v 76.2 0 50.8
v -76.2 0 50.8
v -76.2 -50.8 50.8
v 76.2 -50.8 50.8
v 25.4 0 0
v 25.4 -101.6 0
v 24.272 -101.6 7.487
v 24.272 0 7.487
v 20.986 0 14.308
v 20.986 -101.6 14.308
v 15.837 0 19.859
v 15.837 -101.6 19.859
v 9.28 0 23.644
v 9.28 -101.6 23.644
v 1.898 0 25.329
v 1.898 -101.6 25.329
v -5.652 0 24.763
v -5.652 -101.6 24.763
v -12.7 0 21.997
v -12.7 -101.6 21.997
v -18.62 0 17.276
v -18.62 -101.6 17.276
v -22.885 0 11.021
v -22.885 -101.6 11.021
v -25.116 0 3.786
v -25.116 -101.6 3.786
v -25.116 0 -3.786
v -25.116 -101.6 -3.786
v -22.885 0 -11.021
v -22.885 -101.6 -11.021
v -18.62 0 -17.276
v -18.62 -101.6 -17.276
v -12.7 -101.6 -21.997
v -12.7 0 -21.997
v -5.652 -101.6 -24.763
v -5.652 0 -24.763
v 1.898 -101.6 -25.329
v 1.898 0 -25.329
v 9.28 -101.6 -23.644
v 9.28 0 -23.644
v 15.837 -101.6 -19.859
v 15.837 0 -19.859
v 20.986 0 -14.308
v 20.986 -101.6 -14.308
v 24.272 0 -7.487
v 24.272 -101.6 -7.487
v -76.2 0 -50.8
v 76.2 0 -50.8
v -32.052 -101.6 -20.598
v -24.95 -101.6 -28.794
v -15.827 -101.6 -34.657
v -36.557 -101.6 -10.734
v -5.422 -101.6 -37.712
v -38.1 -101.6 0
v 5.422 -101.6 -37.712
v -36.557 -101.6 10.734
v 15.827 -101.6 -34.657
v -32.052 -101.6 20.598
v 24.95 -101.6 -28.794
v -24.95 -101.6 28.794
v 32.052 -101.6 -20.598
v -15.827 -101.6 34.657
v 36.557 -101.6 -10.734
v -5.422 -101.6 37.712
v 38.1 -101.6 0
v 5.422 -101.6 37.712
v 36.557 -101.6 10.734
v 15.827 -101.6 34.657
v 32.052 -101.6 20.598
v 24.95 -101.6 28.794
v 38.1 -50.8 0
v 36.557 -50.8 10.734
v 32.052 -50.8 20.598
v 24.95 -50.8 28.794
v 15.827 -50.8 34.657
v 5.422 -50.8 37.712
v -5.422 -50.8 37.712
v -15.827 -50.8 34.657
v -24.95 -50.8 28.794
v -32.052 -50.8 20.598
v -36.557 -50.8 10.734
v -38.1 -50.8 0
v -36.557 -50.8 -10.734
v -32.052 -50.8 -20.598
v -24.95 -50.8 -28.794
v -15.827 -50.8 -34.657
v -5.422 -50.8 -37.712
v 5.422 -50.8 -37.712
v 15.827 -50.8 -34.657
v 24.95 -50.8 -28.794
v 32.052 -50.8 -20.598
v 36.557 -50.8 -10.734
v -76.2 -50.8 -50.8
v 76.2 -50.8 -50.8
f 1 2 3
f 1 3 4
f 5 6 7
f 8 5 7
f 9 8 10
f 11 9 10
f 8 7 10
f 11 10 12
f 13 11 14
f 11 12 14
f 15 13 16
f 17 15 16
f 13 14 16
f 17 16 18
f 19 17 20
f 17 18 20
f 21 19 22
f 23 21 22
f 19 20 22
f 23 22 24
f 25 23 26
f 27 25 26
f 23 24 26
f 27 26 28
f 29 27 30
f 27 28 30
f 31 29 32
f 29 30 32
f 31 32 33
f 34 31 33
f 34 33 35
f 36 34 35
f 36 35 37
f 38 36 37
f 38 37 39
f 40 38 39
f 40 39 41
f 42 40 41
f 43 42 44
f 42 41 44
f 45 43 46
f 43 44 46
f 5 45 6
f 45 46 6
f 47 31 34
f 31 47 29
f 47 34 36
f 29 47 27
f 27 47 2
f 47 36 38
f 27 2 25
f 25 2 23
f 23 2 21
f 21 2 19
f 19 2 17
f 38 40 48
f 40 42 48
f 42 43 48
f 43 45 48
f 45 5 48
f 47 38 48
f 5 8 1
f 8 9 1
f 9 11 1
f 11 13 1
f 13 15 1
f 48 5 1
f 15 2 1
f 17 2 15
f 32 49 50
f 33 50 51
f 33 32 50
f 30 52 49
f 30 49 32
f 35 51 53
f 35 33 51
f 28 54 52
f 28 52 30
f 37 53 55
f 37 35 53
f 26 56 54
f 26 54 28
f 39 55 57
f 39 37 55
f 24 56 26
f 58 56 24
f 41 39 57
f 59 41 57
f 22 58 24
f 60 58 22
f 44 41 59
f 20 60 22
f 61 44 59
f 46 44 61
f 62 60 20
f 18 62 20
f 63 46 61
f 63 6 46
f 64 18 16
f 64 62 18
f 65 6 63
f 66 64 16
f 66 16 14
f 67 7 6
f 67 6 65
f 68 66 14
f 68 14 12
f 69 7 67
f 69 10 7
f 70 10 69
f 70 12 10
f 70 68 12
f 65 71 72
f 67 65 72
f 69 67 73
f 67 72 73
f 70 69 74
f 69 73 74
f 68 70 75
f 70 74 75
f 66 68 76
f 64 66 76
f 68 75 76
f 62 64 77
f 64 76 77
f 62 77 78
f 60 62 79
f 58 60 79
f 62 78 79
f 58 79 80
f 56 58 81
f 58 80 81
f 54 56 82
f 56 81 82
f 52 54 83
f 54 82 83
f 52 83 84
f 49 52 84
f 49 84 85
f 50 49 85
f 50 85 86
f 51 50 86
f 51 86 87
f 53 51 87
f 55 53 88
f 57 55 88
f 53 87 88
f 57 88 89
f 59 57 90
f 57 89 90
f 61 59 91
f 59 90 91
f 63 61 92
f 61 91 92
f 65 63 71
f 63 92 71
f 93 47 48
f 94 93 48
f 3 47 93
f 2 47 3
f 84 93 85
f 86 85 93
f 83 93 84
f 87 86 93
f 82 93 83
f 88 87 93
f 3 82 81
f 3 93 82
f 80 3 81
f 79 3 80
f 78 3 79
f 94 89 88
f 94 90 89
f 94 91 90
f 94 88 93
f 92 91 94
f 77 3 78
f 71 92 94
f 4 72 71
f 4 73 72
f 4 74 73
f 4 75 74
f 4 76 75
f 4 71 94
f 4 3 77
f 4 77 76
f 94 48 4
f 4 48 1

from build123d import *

# Parameters (mm, degrees)
F0_W     = 152.4
F0_H     = 101.6
F1_DEPTH = 50.8
F3_R     = 38.1
F4_DEPTH = 50.8
F5_R     = 25.4
F6_DEPTH = 101.6


with BuildPart() as f1:
    # F0 (on Front) → F1 (new body)
    with BuildSketch(Plane.XZ):
        Rectangle(F0_W, F0_H)
    extrude(amount=F1_DEPTH)

    # F3 (on face) → F4 (join)
    with BuildSketch(Plane.XZ.offset(50.8)):
        Circle(F3_R)
    extrude(amount=F4_DEPTH)

    # F5 (on face) → F6 (cut)
    with BuildSketch(Plane.XZ.offset(101.6)):
        Circle(F5_R)
    extrude(amount=-F6_DEPTH, mode=Mode.SUBTRACT)


solid = f1.part
